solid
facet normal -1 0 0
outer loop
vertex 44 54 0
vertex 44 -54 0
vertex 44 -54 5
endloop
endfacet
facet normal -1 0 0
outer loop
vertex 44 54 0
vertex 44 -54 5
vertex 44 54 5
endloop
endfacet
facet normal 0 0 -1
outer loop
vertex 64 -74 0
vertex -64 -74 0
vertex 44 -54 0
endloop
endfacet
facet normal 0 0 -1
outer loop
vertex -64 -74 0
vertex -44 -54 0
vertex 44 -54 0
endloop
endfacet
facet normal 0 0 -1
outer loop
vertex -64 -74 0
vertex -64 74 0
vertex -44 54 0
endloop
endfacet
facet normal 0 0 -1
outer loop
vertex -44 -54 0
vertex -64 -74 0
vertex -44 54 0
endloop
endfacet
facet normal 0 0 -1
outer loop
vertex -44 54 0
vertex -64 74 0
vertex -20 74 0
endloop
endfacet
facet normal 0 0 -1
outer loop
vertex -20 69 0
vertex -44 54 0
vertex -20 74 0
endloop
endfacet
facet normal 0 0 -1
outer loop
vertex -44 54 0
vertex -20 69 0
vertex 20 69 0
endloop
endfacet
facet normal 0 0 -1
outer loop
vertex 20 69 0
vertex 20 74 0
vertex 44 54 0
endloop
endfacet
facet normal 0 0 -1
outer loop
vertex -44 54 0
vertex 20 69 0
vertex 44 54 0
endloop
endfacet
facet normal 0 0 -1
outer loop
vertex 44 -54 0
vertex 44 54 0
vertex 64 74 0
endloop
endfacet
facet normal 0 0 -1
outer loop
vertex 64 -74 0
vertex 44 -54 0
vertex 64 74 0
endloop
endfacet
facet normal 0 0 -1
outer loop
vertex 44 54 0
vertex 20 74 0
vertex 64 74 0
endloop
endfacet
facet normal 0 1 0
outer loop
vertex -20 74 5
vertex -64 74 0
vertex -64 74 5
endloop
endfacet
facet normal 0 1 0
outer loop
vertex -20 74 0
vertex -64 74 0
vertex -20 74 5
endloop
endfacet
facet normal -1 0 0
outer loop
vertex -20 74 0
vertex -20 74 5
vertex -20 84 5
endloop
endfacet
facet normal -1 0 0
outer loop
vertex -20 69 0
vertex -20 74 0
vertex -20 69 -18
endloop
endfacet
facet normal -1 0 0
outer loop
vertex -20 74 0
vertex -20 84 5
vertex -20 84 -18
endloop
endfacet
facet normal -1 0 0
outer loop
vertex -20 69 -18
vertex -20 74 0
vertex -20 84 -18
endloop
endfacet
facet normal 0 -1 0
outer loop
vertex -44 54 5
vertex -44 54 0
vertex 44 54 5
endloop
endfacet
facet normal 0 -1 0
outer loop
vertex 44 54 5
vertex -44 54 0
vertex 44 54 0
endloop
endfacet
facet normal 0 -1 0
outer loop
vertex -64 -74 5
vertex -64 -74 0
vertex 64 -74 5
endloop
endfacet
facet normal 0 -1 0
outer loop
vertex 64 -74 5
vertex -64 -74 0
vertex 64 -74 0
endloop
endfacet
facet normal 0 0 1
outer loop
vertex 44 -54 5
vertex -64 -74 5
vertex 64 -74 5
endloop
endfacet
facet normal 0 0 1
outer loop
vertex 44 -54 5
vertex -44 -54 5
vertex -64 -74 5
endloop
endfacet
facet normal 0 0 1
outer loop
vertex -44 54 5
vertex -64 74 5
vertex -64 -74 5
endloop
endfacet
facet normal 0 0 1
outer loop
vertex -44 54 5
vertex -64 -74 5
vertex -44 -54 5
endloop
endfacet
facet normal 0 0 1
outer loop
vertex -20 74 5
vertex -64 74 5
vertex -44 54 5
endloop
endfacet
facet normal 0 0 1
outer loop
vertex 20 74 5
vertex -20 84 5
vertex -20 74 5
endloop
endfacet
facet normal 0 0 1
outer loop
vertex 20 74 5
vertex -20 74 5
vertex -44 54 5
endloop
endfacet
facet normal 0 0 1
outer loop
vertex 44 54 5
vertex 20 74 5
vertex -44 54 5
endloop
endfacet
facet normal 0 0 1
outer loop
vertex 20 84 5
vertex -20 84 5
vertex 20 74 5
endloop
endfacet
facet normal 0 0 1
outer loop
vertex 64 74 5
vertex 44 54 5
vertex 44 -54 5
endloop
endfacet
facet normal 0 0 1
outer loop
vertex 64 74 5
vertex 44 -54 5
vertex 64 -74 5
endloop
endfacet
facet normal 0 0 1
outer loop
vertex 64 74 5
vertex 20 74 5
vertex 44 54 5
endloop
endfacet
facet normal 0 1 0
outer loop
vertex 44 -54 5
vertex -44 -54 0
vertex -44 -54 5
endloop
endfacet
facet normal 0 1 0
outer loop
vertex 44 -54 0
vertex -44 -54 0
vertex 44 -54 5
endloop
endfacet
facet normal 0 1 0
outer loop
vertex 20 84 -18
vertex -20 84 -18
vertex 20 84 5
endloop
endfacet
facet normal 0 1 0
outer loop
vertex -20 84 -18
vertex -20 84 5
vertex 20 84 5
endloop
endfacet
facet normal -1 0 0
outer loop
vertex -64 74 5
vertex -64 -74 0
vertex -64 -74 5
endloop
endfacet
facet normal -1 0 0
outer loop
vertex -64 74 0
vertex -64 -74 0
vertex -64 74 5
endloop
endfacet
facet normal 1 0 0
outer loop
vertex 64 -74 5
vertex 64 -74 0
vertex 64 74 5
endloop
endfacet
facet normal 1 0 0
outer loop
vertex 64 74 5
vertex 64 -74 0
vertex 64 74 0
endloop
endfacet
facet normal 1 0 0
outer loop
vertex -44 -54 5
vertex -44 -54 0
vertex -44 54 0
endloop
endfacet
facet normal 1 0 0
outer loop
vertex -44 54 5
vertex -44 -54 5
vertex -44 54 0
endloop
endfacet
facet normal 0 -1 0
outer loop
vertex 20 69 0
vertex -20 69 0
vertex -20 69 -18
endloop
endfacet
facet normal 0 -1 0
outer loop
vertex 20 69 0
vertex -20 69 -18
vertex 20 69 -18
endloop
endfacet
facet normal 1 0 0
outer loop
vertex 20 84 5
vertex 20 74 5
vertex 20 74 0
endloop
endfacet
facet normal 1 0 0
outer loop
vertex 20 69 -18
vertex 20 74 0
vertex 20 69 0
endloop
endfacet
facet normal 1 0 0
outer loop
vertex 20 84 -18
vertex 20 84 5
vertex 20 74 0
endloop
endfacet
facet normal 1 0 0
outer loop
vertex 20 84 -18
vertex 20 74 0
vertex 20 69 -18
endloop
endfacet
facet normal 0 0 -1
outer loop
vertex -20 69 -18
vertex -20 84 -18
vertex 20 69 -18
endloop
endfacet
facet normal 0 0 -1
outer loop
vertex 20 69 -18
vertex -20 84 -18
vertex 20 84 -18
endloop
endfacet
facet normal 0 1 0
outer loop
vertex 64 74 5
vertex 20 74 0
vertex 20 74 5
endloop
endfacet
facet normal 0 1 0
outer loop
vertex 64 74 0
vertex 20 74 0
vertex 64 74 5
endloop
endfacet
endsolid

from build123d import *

# Parameters (mm, degrees)
F3_W     = 128
F3_H     = 148
F3_W_2   = 88
F3_H_2   = 108
F4_DEPTH = 5
F5_W     = 40
F5_H     = 5
F6_DEPTH = 10
F7_W     = 40
F7_H     = 10
F8_DEPTH = 18
F9_DEPTH = 5


with BuildPart() as f4:
    # F3 (on Top) → F4 (new body)
    with BuildSketch(Plane.XY):
        Rectangle(F3_W, F3_H)
        Rectangle(F3_W_2, F3_H_2, mode=Mode.SUBTRACT)
    extrude(amount=F4_DEPTH)

    # F5 (on face) → F6 (join)
    with BuildSketch(Plane(origin=(0, 74, 0), x_dir=(-1, 0, 0), z_dir=(0, 1, 0))):
        with Locations((0, 2.5)):
            Rectangle(F5_W, F5_H)
    extrude(amount=F6_DEPTH)

    # F7 (on face) → F8 (join)
    with BuildSketch(Plane(origin=(0, 0, 0), x_dir=(1, 0, 0), z_dir=(0, 0, -1))):
        with Locations((0, -79)):
            Rectangle(F7_W, F7_H)
    extrude(amount=F8_DEPTH)

    # F9 (add): a face of the model
    f9_faces = [f4.faces().sort_by_distance(p)[0] for p in [
        (0, 74, -9),
    ]]
    extrude(f9_faces, amount=F9_DEPTH)


solid = f4.part
